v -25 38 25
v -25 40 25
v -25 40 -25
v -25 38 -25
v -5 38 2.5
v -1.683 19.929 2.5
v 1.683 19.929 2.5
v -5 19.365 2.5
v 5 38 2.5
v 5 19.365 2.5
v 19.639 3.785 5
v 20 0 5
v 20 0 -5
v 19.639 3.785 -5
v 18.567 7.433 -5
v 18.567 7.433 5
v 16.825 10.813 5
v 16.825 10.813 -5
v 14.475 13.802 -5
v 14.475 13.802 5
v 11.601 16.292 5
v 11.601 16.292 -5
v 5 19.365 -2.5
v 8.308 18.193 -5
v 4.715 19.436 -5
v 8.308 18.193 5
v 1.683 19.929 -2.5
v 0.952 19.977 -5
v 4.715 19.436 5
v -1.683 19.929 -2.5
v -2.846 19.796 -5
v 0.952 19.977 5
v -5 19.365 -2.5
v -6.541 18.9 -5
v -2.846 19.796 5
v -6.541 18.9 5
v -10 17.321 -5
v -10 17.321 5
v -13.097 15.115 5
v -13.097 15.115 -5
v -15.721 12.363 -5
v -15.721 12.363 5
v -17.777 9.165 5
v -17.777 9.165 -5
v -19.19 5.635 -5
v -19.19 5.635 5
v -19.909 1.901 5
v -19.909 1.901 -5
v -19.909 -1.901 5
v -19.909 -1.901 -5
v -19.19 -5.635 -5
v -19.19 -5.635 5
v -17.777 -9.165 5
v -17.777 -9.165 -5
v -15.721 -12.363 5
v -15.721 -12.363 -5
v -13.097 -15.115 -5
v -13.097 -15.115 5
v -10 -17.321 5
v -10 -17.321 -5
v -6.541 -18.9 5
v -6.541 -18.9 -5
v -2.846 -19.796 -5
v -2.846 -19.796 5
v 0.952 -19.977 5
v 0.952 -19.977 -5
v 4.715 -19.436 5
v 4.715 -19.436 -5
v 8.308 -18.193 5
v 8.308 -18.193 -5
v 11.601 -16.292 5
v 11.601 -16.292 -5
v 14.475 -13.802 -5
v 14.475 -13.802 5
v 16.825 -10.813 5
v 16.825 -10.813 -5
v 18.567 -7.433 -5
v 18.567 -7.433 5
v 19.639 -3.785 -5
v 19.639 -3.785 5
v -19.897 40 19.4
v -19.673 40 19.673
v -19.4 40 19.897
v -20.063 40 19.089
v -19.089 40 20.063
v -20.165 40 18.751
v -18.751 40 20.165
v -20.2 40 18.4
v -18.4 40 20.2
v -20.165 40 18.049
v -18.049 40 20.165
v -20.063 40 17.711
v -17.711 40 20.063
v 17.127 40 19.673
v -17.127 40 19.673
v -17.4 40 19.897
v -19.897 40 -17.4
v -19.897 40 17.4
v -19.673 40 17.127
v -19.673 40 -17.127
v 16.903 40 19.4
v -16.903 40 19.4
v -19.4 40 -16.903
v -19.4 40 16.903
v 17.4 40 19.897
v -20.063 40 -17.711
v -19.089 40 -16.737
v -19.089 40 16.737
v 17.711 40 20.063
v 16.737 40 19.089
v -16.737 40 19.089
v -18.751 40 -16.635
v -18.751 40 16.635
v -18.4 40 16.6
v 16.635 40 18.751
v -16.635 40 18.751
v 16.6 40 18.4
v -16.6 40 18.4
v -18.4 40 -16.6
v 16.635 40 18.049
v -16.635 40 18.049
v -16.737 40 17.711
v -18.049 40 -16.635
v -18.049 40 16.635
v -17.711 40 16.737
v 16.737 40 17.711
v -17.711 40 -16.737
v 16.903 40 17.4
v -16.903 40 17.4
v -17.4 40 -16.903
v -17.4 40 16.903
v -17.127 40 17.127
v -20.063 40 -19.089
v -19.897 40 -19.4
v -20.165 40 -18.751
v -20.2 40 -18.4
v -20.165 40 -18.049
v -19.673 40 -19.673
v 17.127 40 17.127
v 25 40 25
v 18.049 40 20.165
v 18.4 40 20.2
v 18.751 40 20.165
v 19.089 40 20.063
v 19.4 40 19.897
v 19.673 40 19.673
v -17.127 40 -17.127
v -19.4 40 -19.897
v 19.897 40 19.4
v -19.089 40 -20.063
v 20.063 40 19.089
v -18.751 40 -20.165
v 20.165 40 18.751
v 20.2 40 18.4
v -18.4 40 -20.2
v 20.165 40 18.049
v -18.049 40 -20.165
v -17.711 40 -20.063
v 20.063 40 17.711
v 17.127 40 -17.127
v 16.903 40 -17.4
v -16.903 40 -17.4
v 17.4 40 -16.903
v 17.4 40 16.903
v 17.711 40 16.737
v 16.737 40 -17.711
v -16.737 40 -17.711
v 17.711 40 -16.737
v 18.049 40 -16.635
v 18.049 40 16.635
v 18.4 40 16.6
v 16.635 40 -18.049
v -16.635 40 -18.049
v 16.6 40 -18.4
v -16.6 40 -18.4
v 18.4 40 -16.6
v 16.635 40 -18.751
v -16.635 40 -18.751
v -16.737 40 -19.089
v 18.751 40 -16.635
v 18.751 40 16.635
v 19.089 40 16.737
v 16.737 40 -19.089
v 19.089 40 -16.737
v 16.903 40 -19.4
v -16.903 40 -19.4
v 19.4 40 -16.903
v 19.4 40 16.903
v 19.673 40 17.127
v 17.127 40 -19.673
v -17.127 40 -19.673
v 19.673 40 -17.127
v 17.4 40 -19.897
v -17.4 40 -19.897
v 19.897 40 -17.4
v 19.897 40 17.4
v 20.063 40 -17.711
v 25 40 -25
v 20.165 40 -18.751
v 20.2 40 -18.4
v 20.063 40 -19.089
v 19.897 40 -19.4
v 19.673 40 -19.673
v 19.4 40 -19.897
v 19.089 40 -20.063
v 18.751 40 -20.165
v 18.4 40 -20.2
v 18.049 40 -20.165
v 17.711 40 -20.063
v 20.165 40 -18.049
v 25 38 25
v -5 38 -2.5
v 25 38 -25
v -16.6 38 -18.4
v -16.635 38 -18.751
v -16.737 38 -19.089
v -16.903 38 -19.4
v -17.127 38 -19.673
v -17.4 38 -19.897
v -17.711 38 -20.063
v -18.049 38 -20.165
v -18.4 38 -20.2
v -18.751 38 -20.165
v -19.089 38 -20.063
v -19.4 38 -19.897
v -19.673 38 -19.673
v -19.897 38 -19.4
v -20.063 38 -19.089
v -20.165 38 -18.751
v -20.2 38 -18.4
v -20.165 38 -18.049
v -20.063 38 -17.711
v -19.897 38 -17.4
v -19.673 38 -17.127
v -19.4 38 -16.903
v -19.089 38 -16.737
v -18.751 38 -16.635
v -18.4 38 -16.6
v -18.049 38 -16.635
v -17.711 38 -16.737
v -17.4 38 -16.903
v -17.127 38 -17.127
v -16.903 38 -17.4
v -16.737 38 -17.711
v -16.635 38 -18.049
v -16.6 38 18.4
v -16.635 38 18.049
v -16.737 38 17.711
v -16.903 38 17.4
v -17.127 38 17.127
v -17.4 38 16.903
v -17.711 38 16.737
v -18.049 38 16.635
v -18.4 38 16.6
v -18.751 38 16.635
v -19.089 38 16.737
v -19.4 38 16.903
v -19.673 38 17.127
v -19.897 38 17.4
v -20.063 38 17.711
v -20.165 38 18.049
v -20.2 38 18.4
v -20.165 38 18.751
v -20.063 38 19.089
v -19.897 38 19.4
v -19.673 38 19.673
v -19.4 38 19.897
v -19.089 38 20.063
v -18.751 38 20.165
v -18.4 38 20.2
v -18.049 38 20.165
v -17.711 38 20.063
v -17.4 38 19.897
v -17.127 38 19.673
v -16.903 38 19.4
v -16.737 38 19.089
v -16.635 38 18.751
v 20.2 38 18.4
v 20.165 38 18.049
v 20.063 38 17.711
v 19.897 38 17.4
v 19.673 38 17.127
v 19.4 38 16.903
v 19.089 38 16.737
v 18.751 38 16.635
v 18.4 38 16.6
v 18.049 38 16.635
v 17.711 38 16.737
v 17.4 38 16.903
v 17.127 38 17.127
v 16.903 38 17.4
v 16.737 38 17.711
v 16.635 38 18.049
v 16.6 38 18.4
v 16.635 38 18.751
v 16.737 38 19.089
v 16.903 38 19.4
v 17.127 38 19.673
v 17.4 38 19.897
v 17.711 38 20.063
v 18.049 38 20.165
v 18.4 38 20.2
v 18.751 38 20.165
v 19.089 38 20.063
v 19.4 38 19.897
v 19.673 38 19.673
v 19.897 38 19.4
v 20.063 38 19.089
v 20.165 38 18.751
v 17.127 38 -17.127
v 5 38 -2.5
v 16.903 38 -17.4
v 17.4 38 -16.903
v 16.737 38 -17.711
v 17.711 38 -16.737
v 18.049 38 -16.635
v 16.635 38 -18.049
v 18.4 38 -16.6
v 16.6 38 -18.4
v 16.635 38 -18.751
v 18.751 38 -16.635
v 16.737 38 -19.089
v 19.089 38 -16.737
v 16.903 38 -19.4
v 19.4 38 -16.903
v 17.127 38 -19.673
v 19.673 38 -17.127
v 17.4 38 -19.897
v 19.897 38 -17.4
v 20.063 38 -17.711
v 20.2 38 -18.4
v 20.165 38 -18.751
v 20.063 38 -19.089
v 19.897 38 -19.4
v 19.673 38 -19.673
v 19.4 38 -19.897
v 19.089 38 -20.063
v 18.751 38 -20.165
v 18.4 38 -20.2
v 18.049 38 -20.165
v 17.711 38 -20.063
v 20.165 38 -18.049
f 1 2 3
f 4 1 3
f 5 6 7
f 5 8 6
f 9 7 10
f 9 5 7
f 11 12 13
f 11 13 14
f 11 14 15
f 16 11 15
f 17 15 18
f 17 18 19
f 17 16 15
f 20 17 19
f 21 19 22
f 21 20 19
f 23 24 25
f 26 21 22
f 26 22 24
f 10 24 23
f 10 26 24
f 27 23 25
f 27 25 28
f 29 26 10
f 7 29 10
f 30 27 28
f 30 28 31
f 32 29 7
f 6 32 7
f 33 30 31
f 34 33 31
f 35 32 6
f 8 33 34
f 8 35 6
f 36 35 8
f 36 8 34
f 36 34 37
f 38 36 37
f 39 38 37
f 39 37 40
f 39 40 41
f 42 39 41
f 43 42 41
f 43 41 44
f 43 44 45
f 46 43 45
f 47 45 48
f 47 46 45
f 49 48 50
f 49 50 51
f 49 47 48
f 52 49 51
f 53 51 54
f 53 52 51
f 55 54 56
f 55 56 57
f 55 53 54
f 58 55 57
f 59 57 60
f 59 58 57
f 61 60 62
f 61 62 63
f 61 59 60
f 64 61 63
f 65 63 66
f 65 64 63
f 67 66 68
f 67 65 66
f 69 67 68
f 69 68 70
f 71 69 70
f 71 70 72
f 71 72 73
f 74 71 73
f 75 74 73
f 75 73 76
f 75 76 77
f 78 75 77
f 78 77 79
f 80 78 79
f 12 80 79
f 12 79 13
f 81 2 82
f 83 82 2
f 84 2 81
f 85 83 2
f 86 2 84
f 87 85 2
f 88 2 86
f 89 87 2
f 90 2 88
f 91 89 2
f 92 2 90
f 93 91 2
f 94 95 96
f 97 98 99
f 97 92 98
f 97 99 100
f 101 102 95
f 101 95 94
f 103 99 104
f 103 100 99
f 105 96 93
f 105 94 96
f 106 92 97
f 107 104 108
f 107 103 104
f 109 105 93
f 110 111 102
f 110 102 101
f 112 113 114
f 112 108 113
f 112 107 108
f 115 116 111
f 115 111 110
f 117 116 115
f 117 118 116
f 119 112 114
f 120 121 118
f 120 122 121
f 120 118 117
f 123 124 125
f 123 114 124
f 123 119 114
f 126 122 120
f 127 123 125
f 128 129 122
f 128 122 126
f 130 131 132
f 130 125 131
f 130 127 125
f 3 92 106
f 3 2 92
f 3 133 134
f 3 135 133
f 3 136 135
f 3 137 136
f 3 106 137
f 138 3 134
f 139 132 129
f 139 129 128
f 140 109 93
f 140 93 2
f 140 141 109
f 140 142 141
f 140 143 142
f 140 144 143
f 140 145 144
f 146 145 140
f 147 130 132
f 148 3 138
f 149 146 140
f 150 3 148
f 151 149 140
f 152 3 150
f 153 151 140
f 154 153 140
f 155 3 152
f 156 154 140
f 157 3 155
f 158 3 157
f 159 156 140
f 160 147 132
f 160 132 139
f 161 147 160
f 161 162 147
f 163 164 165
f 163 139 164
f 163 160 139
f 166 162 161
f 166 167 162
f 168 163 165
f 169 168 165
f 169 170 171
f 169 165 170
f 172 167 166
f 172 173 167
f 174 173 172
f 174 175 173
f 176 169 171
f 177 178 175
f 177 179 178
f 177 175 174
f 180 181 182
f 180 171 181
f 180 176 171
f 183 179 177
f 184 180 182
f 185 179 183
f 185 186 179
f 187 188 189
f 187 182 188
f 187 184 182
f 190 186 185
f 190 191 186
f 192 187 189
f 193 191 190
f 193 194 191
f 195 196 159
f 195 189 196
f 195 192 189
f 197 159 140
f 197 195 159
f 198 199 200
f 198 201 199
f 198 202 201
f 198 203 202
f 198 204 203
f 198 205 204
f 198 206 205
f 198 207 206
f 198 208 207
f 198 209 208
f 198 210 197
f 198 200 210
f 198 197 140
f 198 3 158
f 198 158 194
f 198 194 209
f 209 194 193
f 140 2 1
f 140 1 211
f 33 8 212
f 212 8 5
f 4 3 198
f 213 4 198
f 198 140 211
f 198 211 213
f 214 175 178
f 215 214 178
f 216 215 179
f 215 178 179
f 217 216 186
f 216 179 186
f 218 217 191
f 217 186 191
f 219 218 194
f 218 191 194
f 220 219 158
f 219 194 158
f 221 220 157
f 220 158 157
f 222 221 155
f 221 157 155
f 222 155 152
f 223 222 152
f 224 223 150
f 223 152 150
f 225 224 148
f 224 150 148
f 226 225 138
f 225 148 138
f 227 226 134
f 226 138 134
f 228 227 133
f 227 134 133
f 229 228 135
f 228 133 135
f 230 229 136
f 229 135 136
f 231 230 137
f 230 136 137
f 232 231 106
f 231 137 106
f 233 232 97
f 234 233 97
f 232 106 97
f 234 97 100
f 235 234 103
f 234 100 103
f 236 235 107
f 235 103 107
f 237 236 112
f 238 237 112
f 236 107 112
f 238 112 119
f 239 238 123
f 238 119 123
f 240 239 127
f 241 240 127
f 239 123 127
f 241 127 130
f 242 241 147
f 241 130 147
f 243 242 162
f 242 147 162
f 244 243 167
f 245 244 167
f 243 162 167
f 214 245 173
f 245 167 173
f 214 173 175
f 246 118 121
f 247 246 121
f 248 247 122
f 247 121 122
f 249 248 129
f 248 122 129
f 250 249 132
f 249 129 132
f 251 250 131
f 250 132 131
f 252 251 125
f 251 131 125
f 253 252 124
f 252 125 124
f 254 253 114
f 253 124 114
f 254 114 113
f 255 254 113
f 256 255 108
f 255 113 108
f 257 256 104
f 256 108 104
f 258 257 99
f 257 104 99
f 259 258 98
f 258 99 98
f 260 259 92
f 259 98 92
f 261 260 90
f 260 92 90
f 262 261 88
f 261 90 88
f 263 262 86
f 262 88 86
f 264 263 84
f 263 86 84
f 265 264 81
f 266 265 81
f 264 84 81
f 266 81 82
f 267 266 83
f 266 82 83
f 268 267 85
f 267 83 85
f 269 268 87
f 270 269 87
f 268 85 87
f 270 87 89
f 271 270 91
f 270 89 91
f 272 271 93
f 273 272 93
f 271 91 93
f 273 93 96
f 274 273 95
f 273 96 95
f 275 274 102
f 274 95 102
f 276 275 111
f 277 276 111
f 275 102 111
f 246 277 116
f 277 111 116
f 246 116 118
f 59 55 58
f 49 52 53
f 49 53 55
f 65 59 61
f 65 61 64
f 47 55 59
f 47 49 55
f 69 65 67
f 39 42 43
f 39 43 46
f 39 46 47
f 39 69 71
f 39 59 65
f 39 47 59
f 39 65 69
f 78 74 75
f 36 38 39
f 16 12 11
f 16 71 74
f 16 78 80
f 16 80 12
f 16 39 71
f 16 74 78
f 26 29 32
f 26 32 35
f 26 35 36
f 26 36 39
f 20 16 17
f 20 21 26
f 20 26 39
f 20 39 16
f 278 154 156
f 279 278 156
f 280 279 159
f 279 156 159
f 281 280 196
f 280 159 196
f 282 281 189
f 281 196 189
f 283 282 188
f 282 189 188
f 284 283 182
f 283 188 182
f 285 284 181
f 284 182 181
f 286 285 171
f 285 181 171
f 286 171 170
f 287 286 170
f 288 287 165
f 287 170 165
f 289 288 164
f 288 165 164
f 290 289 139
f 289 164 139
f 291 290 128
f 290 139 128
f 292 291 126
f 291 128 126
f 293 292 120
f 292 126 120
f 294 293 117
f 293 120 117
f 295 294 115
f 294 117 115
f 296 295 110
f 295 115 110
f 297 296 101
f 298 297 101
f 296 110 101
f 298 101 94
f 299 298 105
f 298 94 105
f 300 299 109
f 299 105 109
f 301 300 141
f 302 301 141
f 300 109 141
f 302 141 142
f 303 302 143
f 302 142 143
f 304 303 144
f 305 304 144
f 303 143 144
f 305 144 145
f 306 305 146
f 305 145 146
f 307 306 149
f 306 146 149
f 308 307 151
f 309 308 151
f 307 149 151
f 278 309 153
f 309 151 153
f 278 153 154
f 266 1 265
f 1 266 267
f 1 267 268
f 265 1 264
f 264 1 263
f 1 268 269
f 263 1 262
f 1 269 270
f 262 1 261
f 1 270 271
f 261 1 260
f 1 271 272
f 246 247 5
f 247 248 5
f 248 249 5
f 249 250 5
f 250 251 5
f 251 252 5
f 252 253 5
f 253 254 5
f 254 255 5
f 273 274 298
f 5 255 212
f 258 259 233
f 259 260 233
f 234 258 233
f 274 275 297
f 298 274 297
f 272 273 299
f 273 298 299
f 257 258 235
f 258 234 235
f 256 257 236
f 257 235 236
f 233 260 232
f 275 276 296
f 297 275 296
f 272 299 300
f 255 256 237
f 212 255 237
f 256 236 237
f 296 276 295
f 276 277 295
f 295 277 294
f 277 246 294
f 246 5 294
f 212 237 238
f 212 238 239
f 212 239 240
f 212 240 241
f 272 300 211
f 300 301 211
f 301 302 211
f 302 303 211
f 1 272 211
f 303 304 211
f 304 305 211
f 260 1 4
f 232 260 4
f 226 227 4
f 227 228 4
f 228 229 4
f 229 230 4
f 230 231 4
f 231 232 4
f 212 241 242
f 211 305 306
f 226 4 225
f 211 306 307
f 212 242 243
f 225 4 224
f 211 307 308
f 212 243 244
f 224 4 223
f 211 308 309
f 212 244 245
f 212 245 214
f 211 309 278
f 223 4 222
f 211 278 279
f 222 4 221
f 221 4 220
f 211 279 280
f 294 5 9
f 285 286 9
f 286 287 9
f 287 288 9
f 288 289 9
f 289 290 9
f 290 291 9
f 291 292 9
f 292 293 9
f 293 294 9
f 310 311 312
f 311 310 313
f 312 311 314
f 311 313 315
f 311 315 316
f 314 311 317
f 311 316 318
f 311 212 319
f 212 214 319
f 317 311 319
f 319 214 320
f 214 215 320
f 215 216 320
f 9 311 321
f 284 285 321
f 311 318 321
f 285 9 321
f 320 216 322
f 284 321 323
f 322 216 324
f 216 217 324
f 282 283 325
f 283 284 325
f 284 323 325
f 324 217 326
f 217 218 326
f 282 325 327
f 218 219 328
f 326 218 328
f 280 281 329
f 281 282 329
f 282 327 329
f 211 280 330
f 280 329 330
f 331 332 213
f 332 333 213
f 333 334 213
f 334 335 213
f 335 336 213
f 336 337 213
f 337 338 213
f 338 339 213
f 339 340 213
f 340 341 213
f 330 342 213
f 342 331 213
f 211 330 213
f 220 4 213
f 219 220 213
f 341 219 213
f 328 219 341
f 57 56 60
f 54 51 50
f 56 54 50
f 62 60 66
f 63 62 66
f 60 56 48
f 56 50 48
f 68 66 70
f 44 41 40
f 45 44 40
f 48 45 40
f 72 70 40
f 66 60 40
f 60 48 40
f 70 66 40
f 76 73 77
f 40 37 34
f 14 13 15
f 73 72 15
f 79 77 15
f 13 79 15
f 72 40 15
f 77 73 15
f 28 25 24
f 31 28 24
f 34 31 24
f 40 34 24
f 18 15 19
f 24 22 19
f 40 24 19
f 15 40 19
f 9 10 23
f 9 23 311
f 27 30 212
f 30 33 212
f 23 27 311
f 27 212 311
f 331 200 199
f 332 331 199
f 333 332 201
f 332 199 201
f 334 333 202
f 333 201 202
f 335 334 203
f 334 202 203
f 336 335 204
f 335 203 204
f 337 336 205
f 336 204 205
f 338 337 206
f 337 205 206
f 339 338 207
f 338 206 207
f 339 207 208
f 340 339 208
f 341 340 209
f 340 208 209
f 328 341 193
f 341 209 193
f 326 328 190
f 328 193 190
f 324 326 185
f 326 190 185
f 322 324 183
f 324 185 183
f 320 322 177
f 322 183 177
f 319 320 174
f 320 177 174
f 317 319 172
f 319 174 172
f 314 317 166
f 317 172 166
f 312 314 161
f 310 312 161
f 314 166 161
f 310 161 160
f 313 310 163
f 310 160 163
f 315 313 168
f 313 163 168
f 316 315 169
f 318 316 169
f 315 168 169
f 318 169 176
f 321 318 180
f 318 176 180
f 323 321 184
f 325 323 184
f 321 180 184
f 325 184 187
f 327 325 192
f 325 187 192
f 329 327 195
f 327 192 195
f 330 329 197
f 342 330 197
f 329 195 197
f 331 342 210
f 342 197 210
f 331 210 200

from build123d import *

# Parameters (mm, degrees)
SKETCH_1_R      = 20
EXTRUDE_1_DEPTH = 5
SKETCH_2_R      = 20
SKETCH_2_W      = 10
SKETCH_2_H      = 40
EXTRUDE_2_DEPTH = 2.5
SKETCH_3_W      = 50
SKETCH_3_H      = 50
SKETCH_3_R      = 1.8
EXTRUDE_3_DEPTH = 2


with BuildPart() as part:
    # 草图1 → 凸台-拉伸1 (new body, symmetric)
    with BuildSketch(Plane.XY):
        Circle(SKETCH_1_R)
    extrude(amount=EXTRUDE_1_DEPTH, both=True)

    # 草图2 → 凸台-拉伸2 (add, symmetric)
    with BuildSketch(Plane.XY):
        Circle(SKETCH_2_R)
        with Locations((0, 20)):
            Rectangle(SKETCH_2_W, SKETCH_2_H)
    extrude(amount=EXTRUDE_2_DEPTH, both=True)

    # 草图3 → 凸台-拉伸3 (add)
    with BuildSketch(Plane(origin=(0, 40, 0), x_dir=(1, 0, 0), z_dir=(0, 1, 0))):
        Rectangle(SKETCH_3_W, SKETCH_3_H)
        with Locations((-18.4, 18.4)):
            Circle(SKETCH_3_R, mode=Mode.SUBTRACT)
        with Locations((18.4, 18.4)):
            Circle(SKETCH_3_R, mode=Mode.SUBTRACT)
        with Locations((18.4, -18.4)):
            Circle(SKETCH_3_R, mode=Mode.SUBTRACT)
        with Locations((-18.4, -18.4)):
            Circle(SKETCH_3_R, mode=Mode.SUBTRACT)
    extrude(amount=-EXTRUDE_3_DEPTH)


solid = part.part
